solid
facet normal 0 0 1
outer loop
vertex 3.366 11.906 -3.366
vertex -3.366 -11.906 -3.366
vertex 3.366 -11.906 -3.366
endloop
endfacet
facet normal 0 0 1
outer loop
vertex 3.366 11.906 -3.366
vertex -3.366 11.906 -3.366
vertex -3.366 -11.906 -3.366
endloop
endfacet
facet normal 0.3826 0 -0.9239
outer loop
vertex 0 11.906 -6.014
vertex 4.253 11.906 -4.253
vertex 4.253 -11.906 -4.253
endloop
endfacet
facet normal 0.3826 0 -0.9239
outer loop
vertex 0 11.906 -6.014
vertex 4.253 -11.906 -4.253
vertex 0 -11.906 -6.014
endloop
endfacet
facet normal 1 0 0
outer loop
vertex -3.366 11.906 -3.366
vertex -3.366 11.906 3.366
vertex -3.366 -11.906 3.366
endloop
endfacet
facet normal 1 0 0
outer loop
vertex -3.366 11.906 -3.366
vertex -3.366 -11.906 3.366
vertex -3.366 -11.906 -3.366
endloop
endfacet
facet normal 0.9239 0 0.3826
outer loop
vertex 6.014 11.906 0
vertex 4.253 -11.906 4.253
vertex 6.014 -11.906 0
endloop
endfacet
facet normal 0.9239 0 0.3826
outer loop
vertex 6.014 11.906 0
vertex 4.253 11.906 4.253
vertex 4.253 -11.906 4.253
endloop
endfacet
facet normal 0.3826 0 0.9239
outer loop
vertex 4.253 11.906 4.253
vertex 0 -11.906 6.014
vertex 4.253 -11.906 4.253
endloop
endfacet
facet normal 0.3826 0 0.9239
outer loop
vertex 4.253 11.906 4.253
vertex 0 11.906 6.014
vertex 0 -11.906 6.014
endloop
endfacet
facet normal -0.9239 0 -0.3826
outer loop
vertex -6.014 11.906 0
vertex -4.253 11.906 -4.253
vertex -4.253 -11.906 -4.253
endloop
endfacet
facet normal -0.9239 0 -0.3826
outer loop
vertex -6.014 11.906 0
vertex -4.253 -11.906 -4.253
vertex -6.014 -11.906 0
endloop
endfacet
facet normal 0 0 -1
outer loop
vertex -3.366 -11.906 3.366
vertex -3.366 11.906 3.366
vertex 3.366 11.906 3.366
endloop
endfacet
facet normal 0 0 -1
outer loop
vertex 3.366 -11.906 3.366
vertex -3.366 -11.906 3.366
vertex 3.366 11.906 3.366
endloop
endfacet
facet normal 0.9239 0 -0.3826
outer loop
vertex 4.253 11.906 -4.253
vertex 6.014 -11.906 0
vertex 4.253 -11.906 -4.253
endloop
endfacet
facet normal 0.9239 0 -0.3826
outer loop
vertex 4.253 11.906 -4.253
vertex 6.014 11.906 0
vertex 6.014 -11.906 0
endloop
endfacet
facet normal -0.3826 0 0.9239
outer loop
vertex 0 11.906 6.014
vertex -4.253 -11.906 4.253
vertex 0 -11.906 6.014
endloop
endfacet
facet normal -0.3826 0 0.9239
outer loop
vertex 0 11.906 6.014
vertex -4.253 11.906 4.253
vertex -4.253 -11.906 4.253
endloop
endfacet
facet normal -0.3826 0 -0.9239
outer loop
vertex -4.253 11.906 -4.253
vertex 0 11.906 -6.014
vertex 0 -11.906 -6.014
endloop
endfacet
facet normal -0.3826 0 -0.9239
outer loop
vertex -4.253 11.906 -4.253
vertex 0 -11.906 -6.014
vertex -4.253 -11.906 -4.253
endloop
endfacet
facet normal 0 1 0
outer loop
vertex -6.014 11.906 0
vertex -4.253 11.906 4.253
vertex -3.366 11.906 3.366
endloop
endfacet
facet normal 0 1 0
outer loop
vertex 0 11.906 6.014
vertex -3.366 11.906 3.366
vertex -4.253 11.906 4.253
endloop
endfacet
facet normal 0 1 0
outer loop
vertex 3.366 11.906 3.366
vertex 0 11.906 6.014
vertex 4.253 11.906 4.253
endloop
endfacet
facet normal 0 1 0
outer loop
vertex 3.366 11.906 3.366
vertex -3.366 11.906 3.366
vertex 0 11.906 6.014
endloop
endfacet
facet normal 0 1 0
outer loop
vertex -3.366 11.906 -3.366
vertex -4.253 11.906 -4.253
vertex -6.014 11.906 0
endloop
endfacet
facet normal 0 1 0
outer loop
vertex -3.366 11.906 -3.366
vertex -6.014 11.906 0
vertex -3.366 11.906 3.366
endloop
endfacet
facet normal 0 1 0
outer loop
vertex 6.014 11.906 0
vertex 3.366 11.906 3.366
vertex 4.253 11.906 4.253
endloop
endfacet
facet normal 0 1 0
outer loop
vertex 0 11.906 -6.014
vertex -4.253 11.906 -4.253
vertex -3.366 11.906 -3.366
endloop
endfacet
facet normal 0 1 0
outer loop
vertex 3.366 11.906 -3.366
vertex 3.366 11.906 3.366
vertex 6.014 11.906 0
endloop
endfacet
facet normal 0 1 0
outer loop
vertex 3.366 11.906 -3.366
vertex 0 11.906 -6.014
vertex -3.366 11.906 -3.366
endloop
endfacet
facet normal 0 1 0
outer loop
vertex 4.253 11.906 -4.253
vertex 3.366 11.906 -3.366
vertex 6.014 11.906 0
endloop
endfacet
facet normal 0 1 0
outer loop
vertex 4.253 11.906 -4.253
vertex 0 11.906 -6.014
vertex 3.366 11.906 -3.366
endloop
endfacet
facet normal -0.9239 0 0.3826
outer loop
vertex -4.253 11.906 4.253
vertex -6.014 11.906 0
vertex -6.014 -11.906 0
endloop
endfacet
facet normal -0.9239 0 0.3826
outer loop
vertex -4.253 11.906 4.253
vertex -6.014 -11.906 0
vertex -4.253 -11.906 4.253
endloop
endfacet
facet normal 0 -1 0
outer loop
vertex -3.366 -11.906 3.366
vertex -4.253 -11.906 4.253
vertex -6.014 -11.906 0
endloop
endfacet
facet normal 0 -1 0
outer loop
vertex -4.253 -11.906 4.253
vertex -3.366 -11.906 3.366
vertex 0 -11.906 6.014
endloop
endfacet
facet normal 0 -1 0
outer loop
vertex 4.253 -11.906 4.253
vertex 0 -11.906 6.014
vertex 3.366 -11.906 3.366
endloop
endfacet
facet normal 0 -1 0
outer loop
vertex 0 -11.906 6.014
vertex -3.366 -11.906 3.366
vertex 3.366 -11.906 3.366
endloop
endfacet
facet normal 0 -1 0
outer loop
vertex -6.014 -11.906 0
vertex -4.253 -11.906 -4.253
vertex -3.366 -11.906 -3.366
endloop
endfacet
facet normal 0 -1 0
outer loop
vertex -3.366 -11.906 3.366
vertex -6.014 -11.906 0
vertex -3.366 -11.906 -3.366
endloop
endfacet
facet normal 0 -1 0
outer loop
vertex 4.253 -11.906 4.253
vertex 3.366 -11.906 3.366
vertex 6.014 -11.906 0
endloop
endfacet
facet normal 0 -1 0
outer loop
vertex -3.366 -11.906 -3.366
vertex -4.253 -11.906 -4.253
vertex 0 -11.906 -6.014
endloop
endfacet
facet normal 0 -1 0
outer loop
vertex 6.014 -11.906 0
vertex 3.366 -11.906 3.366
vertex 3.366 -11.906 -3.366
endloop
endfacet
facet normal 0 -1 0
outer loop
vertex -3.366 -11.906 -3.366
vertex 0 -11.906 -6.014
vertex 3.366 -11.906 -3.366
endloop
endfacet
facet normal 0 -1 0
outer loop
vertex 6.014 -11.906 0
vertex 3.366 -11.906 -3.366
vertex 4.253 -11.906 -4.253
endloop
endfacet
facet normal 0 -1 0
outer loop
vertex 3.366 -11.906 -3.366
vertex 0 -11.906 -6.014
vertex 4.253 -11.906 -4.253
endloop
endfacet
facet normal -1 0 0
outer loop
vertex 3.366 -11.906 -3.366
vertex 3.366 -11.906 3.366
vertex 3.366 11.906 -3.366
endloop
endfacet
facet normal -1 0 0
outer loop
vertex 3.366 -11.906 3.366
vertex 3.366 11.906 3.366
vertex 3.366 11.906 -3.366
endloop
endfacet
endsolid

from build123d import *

# Parameters (mm, degrees)
SKETCH1_W           = 6.731
SKETCH1_H           = 6.731
BOSS_EXTRUDE1_DEPTH = 11.90625


with BuildPart() as part:
    # Sketch1 → Boss-Extrude1 (new, symmetric)
    with BuildSketch(Plane(origin=(0, 0, 0), x_dir=(1, 0, 0), z_dir=(0, 1, 0))):
        Polygon((6.014041663, 0), (4.252569642, 4.252569642), (0, 6.014041663), (-4.252569642, 4.252569642), (-6.014041663, 0), (-4.252569642, -4.252569642), (0, -6.014041663), (4.252569642, -4.252569642), align=None)
        Rectangle(SKETCH1_W, SKETCH1_H, mode=Mode.SUBTRACT)
    extrude(amount=BOSS_EXTRUDE1_DEPTH, both=True)


solid = part.part
